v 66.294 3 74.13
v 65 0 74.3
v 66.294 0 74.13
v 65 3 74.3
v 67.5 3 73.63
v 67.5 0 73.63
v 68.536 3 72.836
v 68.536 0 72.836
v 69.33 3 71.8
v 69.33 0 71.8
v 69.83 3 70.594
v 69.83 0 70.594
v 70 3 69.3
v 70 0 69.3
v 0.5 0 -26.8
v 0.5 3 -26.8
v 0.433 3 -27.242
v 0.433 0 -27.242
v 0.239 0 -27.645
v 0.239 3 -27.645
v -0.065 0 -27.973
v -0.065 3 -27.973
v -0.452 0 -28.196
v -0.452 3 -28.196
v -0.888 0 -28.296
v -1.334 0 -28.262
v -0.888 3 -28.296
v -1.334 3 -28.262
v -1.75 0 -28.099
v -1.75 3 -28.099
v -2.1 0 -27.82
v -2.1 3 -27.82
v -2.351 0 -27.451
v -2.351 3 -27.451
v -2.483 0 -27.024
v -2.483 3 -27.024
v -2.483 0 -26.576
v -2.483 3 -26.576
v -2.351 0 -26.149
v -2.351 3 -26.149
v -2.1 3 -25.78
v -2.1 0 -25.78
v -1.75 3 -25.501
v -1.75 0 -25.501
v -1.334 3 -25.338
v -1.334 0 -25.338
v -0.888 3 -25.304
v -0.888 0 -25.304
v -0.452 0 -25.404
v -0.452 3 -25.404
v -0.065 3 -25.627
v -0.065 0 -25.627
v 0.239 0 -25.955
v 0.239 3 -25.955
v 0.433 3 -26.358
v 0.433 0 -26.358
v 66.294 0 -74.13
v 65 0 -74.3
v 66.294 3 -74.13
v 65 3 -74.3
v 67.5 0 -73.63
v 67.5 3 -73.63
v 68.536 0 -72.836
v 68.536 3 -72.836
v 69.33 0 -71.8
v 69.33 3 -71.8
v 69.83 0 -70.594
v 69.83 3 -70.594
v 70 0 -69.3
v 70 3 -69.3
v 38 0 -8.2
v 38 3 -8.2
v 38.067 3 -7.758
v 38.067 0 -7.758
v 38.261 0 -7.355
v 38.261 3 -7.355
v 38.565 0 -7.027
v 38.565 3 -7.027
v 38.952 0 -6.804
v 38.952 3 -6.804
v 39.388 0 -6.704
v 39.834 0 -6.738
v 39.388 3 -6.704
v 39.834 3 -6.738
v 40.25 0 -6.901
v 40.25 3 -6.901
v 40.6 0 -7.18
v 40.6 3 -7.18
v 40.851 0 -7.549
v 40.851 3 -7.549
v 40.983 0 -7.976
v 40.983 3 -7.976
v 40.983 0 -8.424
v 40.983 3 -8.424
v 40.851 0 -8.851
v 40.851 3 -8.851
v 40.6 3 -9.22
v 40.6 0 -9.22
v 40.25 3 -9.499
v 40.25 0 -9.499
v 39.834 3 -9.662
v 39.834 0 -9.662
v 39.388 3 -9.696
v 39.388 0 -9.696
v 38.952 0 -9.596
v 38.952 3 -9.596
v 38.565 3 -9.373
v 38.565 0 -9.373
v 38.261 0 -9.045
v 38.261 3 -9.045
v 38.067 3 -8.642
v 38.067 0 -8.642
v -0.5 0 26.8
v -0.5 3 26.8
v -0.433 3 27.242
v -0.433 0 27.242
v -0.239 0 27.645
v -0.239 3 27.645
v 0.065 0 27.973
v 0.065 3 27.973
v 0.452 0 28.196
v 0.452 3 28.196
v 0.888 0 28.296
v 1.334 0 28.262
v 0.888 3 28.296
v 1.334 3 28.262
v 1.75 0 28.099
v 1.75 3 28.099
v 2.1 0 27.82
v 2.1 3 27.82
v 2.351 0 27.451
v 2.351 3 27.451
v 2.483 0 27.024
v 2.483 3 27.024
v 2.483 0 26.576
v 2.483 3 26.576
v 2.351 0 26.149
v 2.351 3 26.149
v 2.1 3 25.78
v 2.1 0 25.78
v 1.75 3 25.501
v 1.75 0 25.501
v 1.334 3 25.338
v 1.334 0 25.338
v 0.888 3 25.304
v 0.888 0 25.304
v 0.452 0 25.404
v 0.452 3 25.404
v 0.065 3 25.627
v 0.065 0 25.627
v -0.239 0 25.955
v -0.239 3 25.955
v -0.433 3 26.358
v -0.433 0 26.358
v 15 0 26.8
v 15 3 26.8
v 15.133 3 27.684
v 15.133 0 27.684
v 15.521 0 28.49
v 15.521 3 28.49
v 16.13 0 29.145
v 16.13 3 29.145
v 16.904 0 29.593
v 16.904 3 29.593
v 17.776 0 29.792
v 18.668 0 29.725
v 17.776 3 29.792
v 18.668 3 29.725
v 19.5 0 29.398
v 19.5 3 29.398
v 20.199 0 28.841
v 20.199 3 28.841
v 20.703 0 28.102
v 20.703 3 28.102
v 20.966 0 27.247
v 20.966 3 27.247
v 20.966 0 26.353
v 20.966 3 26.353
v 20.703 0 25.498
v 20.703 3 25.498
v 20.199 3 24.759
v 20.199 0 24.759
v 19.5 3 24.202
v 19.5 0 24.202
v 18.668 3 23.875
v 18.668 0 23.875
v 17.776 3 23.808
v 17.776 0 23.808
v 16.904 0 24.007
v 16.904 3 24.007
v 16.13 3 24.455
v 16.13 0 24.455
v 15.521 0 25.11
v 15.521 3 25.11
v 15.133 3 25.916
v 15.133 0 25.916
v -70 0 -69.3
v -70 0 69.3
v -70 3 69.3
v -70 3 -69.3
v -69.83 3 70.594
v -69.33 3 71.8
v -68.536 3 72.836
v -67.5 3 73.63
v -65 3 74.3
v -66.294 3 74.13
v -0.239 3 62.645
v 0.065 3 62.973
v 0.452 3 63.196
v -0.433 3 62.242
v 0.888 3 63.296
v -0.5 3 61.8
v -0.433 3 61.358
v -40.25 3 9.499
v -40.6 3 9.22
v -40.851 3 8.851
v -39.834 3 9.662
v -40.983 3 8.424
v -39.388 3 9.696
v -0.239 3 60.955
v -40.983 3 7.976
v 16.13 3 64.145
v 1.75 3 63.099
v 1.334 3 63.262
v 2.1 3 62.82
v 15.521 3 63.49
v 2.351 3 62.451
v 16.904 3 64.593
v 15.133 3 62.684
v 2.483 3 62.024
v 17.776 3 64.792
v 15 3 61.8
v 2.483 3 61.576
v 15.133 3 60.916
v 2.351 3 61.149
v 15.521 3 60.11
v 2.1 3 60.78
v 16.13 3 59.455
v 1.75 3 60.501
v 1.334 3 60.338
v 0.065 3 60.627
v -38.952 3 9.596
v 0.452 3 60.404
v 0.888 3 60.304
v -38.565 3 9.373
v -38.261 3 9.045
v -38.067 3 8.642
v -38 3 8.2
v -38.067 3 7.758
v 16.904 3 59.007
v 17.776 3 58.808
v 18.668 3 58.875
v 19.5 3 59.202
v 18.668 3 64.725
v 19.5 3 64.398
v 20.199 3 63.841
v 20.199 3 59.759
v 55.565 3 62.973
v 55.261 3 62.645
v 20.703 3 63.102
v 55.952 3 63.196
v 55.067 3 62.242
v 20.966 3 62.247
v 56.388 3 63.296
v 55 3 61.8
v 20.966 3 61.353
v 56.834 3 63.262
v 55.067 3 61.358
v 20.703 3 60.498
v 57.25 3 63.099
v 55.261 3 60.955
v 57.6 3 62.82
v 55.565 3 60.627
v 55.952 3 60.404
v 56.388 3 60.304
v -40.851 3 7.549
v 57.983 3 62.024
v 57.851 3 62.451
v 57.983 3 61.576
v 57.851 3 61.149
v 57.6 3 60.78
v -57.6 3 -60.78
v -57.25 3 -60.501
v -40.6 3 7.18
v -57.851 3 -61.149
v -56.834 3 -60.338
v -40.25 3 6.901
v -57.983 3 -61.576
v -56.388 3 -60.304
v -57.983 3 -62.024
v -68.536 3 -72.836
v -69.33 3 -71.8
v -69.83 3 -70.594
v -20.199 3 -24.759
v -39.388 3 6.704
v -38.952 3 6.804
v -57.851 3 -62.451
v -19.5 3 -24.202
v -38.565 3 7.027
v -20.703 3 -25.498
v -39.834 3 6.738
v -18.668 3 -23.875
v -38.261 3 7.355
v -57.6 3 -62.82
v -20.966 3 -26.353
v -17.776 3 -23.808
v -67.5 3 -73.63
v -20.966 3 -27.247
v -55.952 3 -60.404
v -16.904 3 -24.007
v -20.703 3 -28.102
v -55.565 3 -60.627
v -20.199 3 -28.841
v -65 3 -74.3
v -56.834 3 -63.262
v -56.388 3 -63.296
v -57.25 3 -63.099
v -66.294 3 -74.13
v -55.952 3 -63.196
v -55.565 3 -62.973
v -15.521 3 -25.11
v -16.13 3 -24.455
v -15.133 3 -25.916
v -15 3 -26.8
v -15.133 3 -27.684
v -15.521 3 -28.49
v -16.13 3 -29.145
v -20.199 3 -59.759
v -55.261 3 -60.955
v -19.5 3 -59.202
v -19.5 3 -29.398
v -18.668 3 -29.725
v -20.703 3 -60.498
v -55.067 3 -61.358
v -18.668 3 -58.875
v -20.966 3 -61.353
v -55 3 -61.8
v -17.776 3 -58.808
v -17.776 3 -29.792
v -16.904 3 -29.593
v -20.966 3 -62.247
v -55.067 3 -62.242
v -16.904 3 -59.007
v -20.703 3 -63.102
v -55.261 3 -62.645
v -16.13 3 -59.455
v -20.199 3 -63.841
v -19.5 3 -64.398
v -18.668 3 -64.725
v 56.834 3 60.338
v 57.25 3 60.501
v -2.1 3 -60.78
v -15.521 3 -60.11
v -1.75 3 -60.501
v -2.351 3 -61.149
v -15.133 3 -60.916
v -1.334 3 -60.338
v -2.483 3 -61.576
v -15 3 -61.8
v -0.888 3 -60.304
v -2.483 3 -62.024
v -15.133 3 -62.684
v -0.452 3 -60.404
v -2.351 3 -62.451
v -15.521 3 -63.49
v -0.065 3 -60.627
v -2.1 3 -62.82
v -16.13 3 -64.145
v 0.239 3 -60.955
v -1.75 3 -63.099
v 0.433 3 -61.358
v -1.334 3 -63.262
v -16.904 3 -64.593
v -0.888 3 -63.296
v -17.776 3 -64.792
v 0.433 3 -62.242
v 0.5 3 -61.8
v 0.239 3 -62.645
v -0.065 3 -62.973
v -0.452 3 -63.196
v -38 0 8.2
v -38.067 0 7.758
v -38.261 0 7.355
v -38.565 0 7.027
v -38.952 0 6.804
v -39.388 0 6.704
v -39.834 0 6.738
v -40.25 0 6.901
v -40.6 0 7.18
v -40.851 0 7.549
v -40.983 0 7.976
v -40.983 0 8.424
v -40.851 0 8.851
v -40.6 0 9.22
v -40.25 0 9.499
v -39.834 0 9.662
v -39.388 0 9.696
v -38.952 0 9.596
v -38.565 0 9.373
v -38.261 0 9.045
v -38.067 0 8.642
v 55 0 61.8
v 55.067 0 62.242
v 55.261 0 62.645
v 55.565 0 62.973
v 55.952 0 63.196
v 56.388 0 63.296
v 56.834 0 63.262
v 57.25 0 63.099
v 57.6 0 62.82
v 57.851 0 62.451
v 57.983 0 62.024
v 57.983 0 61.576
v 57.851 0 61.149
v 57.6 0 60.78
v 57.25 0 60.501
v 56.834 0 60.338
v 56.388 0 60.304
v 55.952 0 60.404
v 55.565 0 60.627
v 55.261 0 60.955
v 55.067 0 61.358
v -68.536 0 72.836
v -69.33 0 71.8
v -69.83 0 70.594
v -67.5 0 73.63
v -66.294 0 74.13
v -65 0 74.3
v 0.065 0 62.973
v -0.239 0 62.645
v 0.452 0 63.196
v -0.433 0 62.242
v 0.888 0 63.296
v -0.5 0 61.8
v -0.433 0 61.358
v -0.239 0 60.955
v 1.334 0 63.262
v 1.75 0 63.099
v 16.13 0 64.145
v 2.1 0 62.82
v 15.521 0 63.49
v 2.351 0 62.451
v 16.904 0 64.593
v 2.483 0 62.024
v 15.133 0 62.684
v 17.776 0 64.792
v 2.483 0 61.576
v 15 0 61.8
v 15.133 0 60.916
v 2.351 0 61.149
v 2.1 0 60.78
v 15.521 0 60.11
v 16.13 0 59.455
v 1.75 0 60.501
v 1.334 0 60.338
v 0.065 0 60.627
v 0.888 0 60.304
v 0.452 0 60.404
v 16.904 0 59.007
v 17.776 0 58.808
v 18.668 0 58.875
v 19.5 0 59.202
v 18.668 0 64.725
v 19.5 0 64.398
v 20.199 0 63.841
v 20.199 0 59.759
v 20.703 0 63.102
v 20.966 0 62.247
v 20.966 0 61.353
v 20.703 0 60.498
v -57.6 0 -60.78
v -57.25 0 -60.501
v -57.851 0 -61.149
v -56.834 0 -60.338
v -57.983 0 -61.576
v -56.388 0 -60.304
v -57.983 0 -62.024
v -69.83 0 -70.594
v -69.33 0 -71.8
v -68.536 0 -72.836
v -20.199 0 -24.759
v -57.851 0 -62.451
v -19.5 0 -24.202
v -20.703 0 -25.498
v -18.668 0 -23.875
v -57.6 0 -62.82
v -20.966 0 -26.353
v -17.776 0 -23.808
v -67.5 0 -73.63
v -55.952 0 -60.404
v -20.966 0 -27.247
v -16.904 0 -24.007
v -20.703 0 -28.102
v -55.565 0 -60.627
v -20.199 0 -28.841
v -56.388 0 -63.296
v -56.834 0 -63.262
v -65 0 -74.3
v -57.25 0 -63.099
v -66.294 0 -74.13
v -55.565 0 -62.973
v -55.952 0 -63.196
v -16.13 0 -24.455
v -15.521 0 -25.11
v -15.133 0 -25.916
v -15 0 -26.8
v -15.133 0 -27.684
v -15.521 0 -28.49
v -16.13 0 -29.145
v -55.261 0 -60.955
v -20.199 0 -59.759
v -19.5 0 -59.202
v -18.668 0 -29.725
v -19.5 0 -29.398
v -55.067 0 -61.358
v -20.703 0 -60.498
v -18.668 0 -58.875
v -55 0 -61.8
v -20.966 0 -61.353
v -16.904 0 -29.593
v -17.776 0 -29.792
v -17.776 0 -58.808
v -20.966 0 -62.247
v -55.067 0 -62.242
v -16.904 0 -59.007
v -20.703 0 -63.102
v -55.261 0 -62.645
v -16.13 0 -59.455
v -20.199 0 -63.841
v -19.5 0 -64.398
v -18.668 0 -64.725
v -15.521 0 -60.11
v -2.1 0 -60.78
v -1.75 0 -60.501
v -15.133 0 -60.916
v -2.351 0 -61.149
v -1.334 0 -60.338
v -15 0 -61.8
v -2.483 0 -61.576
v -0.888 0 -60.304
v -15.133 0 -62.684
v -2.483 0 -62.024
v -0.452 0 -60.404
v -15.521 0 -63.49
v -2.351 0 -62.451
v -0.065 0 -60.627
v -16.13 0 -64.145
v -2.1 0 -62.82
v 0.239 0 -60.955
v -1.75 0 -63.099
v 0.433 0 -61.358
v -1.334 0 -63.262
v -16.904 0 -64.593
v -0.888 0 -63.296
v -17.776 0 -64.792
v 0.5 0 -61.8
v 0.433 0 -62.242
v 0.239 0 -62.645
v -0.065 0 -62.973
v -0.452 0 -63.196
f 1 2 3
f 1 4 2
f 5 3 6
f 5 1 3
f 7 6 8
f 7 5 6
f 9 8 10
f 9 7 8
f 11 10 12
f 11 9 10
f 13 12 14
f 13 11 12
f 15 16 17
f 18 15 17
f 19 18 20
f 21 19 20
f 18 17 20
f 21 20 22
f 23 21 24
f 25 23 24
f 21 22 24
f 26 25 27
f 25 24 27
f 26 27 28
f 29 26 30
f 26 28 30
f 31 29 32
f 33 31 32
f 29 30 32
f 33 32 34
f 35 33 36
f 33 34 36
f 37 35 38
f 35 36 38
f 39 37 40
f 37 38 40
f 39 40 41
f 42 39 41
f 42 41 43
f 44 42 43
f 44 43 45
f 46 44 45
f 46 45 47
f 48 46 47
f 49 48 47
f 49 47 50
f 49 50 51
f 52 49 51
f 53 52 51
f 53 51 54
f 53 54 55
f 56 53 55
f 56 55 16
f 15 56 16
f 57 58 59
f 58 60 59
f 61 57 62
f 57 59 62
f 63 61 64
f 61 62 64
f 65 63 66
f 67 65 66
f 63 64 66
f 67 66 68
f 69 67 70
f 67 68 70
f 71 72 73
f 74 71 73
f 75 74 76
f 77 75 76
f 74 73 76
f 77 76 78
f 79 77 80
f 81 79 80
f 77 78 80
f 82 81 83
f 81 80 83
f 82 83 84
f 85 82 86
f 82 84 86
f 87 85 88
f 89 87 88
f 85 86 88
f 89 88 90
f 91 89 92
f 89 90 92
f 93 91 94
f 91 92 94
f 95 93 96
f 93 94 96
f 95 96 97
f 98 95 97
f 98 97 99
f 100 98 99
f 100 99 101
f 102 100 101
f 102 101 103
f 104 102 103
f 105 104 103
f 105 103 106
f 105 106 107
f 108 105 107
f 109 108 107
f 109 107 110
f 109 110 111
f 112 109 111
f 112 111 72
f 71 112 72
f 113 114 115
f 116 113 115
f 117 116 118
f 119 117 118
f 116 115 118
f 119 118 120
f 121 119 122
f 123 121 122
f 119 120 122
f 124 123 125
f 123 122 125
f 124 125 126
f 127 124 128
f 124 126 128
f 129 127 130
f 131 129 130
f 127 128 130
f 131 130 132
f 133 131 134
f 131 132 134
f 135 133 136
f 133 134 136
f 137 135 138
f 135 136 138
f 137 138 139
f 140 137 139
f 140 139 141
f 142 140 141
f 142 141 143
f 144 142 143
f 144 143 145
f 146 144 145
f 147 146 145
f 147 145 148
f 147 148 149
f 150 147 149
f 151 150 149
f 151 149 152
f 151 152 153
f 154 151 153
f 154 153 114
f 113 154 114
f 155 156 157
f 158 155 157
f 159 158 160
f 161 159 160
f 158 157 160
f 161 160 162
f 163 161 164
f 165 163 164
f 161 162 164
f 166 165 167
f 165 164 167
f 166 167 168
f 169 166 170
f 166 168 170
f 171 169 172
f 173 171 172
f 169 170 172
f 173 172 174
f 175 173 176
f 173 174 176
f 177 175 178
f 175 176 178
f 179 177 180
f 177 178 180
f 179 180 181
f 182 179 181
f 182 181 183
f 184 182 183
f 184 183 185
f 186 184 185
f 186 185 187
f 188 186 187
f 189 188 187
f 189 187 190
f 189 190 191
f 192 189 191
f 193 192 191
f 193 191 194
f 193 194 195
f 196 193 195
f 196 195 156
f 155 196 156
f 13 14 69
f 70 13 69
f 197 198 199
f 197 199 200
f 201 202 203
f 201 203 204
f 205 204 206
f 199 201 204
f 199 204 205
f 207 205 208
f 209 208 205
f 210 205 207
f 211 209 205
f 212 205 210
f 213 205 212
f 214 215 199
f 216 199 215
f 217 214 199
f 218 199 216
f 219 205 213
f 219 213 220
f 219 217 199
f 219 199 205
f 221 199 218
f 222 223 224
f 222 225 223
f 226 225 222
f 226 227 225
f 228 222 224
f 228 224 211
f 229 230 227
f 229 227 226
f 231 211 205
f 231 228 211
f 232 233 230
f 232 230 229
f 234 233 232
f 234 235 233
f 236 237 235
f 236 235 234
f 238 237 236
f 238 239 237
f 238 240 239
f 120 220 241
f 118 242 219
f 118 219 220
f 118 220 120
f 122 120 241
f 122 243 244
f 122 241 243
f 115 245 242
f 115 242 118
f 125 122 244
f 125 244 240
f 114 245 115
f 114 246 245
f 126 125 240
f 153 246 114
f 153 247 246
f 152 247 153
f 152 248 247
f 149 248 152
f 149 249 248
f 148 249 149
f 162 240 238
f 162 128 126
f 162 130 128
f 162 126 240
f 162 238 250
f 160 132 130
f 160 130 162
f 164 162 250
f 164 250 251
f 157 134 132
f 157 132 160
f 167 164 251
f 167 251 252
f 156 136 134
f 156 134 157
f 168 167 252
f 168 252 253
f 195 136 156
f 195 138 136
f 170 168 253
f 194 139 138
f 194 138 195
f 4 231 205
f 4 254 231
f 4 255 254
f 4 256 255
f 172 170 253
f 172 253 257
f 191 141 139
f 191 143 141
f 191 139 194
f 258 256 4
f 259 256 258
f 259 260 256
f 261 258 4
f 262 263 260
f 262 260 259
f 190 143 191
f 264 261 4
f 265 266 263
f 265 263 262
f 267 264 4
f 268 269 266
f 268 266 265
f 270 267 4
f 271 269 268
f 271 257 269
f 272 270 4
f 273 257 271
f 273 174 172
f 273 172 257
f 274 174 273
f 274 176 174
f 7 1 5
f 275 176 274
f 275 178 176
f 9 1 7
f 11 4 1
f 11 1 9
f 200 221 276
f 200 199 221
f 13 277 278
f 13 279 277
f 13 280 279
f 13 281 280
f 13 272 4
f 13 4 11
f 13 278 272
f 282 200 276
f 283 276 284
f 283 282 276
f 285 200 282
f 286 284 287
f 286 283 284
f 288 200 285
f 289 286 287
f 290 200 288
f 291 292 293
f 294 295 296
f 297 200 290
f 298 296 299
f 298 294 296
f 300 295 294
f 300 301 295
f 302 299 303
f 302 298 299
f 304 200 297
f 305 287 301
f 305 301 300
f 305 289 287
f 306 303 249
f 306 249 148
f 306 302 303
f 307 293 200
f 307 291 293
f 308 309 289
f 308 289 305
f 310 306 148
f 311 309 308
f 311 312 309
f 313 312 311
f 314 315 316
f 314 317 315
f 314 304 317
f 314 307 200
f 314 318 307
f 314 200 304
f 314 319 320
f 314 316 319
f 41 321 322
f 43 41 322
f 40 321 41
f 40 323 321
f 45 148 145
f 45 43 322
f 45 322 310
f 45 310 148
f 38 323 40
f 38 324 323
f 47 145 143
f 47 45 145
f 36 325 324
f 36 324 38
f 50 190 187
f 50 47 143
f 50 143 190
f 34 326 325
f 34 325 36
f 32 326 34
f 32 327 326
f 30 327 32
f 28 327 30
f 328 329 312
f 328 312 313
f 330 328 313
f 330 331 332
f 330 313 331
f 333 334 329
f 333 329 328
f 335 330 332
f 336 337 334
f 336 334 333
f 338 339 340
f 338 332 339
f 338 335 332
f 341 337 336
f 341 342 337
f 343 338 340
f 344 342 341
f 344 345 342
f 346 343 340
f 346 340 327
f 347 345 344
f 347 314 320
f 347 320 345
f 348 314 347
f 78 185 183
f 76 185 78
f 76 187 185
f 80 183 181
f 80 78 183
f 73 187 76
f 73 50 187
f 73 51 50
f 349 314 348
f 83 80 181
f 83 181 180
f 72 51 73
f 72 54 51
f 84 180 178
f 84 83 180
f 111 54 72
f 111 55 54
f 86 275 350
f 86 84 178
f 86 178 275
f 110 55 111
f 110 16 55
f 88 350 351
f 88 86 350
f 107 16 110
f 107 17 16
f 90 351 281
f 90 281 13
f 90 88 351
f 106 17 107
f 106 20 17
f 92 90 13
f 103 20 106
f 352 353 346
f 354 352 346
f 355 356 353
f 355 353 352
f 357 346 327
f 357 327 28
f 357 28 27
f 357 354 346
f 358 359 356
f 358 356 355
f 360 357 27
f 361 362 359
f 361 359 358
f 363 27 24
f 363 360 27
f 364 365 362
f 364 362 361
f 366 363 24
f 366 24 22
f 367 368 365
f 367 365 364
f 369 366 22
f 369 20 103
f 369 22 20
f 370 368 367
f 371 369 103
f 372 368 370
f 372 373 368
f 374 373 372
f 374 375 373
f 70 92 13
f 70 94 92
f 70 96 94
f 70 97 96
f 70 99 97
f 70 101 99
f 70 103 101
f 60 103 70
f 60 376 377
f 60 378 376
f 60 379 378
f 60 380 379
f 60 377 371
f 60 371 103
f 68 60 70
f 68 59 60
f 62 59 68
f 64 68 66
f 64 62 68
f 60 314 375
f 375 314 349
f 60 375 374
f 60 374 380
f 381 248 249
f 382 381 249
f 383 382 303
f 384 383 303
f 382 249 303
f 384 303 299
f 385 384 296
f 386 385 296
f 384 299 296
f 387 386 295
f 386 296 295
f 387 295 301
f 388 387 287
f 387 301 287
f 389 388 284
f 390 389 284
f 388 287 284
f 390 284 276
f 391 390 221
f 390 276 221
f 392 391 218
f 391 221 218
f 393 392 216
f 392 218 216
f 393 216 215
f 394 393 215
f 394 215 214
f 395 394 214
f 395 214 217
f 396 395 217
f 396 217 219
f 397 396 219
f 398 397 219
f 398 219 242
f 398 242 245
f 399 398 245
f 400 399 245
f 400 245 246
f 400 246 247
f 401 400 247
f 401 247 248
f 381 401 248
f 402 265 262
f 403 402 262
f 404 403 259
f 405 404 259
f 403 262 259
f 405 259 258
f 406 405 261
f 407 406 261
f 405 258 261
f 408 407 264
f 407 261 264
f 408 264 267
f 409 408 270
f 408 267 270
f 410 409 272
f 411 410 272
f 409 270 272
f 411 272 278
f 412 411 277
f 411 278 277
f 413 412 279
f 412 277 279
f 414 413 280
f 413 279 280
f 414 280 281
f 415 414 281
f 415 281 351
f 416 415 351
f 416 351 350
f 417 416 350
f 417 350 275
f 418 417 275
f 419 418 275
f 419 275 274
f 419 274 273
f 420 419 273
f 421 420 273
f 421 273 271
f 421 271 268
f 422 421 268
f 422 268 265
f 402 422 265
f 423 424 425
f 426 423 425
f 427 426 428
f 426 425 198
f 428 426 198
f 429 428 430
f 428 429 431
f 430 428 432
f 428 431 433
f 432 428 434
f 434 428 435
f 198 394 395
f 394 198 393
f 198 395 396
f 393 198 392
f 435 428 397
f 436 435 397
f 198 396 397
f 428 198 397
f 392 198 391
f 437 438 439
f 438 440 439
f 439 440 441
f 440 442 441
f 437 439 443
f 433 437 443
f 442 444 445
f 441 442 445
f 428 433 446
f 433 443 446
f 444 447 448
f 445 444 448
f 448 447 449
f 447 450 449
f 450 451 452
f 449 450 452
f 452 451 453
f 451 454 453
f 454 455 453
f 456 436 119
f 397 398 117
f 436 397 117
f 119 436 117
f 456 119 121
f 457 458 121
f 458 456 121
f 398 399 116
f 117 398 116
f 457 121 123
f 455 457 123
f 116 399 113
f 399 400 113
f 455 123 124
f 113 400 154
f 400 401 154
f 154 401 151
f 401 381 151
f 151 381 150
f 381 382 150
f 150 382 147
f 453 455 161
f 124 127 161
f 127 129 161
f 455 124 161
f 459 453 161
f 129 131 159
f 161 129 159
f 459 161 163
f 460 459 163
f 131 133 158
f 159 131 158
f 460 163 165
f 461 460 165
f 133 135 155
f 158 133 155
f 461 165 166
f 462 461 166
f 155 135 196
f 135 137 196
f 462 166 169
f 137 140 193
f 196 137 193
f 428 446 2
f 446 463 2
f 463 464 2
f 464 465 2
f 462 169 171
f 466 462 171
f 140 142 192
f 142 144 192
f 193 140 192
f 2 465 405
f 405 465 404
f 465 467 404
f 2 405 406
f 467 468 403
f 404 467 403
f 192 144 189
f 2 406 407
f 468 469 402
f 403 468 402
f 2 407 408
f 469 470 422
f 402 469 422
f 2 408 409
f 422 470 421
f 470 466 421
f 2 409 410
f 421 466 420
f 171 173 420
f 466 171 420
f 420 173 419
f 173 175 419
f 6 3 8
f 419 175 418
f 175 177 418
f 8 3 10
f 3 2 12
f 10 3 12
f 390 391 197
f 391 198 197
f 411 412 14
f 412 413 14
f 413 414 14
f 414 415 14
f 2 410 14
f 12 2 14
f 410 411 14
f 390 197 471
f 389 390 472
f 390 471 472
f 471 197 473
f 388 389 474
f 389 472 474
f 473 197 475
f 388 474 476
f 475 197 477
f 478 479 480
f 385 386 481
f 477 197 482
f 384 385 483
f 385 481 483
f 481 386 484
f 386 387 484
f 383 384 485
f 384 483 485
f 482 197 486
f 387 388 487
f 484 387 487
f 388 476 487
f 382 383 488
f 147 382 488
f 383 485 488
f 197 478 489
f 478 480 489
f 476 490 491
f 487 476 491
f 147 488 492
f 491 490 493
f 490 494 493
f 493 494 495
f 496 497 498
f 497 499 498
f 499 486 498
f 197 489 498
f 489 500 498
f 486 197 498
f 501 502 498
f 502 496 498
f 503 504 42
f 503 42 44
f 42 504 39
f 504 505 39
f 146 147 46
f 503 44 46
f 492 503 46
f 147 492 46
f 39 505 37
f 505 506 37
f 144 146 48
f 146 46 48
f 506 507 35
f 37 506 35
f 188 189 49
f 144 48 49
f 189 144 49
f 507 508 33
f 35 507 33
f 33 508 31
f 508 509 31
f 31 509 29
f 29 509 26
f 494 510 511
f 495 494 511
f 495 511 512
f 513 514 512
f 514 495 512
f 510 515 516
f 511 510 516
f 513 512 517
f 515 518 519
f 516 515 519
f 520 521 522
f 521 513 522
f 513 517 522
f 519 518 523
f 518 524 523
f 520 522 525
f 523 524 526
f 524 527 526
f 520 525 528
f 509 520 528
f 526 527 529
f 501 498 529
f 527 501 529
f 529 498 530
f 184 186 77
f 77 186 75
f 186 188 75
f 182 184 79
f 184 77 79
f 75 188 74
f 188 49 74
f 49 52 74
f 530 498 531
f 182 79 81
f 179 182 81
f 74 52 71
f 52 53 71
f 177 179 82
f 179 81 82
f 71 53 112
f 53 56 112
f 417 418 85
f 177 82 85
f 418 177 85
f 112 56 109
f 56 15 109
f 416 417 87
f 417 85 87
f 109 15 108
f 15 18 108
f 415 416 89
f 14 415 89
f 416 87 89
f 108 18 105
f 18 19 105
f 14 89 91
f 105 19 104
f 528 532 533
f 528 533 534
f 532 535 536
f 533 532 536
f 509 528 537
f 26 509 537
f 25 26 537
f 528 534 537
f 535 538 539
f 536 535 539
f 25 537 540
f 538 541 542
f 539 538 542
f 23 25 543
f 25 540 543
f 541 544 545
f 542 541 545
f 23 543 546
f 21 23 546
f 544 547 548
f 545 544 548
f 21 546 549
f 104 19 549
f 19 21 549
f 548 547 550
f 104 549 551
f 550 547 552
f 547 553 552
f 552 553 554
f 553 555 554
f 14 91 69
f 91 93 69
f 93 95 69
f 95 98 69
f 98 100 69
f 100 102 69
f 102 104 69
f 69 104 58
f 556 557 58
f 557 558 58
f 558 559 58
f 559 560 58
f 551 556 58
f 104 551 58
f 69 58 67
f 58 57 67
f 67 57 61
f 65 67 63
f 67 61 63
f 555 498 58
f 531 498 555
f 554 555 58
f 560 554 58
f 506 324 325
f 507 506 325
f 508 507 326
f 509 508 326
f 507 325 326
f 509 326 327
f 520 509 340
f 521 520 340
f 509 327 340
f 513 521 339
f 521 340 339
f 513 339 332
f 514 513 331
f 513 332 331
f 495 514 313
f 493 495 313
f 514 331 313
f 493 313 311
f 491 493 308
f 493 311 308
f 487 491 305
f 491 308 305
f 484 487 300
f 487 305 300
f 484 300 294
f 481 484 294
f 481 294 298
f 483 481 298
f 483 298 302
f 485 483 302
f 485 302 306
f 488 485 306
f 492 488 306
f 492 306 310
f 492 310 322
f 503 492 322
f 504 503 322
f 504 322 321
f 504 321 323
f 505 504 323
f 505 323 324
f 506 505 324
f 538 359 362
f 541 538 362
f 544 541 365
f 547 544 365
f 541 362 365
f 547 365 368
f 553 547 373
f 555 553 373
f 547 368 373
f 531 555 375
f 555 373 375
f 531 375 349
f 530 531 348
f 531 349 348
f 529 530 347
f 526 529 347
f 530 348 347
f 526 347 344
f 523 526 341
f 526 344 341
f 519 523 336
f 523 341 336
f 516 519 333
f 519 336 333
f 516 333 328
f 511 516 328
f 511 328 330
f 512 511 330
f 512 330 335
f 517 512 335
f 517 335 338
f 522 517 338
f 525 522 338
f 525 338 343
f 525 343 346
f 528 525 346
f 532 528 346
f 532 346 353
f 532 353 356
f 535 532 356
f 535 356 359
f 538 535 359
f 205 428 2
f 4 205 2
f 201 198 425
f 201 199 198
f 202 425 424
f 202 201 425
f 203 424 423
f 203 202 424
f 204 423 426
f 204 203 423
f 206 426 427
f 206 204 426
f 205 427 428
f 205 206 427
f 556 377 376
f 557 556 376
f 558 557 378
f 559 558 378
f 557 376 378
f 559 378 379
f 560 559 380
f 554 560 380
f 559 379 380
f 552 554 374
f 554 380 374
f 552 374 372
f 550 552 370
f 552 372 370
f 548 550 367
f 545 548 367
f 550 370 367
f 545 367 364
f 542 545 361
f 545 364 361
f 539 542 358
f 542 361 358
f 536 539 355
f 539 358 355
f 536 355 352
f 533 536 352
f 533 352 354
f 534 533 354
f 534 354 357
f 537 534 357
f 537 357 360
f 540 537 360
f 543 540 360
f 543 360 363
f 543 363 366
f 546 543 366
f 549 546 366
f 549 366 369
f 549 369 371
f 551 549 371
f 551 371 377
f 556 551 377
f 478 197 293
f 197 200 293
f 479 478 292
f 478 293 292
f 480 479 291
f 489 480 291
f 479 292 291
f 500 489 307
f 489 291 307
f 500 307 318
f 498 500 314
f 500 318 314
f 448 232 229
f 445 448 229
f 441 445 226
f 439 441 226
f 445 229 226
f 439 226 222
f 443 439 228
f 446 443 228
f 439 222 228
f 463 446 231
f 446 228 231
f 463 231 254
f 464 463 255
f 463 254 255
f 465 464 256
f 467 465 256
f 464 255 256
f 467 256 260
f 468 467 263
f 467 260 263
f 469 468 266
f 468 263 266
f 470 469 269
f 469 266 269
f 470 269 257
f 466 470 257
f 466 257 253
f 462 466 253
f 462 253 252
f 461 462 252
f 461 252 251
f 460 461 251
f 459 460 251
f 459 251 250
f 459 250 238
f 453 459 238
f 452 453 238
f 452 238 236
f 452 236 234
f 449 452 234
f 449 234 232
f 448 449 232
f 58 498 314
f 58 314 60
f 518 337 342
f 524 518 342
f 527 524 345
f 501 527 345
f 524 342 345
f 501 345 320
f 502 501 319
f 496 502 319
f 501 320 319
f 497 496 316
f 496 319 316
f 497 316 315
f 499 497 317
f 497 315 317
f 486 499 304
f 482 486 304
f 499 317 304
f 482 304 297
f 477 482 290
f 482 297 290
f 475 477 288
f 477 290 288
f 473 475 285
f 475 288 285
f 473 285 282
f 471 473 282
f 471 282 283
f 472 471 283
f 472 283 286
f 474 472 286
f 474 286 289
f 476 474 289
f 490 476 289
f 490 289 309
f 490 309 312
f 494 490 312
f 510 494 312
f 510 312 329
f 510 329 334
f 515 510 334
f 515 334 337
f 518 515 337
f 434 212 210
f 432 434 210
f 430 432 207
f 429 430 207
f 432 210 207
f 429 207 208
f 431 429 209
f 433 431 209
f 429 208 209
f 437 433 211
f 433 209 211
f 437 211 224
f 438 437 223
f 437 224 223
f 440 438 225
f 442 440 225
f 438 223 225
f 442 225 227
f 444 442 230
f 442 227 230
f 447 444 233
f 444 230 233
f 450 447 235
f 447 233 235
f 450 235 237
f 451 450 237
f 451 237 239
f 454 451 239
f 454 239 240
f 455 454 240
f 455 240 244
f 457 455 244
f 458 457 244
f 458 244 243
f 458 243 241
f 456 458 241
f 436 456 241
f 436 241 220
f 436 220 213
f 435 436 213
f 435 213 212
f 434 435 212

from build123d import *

# Parameters (mm, degrees)
SKETCH1_W           = 140
SKETCH1_H           = 148.6
BOSS_EXTRUDE1_DEPTH = 3
SKETCH2_R           = 3
SKETCH2_R_2         = 1.5
CUT_EXTRUDE1_DEPTH  = 103.124874541
FILLET1_R           = 5
CIRPATTERN1_COUNT   = 2


with BuildPart() as part:
    # Sketch1 → Boss-Extrude1 (new body)
    with BuildSketch(Plane(origin=(0, 0, 0), x_dir=(1, 0, 0), z_dir=(0, 1, 0))):
        Rectangle(SKETCH1_W, SKETCH1_H)
    extrude(amount=BOSS_EXTRUDE1_DEPTH)

    # Sketch2 → Cut-Extrude1 (cut, through all)
    with BuildSketch(Plane(origin=(0, 3, 0), x_dir=(1, 0, 0), z_dir=(0, 1, 0))):
        with Locations((-18, 26.8)):
            Circle(SKETCH2_R)
        with Locations((-18, 61.8)):
            Circle(SKETCH2_R)
        with Locations((-1, 61.8)):
            Circle(SKETCH2_R_2)
        with Locations((-1, 26.8)):
            Circle(SKETCH2_R_2)
        with Locations((-56.5, 61.8)):
            Circle(SKETCH2_R_2)
        with Locations((-39.5, -8.2)):
            Circle(SKETCH2_R_2)
    cut_extrude1 = extrude(amount=-CUT_EXTRUDE1_DEPTH, mode=Mode.SUBTRACT)

    # Fillet1
    fillet1_edges = [part.edges().sort_by_distance(p)[0] for p in [
        (-70, 1.5, -74.3),
        (70, 1.5, -74.3),
        (70, 1.5, 74.3),
        (-70, 1.5, 74.3),
    ]]
    fillet(fillet1_edges, radius=FILLET1_R)

    # CirPattern1: Cut-Extrude1 ×2 about axis
    cirpattern1_axis = Axis((0, -0.15, 0), (0, 1, 0))
    for i in range(1, CIRPATTERN1_COUNT):
        add(cut_extrude1.rotate(cirpattern1_axis, i * 360 / CIRPATTERN1_COUNT), mode=Mode.SUBTRACT)


solid = part.part
